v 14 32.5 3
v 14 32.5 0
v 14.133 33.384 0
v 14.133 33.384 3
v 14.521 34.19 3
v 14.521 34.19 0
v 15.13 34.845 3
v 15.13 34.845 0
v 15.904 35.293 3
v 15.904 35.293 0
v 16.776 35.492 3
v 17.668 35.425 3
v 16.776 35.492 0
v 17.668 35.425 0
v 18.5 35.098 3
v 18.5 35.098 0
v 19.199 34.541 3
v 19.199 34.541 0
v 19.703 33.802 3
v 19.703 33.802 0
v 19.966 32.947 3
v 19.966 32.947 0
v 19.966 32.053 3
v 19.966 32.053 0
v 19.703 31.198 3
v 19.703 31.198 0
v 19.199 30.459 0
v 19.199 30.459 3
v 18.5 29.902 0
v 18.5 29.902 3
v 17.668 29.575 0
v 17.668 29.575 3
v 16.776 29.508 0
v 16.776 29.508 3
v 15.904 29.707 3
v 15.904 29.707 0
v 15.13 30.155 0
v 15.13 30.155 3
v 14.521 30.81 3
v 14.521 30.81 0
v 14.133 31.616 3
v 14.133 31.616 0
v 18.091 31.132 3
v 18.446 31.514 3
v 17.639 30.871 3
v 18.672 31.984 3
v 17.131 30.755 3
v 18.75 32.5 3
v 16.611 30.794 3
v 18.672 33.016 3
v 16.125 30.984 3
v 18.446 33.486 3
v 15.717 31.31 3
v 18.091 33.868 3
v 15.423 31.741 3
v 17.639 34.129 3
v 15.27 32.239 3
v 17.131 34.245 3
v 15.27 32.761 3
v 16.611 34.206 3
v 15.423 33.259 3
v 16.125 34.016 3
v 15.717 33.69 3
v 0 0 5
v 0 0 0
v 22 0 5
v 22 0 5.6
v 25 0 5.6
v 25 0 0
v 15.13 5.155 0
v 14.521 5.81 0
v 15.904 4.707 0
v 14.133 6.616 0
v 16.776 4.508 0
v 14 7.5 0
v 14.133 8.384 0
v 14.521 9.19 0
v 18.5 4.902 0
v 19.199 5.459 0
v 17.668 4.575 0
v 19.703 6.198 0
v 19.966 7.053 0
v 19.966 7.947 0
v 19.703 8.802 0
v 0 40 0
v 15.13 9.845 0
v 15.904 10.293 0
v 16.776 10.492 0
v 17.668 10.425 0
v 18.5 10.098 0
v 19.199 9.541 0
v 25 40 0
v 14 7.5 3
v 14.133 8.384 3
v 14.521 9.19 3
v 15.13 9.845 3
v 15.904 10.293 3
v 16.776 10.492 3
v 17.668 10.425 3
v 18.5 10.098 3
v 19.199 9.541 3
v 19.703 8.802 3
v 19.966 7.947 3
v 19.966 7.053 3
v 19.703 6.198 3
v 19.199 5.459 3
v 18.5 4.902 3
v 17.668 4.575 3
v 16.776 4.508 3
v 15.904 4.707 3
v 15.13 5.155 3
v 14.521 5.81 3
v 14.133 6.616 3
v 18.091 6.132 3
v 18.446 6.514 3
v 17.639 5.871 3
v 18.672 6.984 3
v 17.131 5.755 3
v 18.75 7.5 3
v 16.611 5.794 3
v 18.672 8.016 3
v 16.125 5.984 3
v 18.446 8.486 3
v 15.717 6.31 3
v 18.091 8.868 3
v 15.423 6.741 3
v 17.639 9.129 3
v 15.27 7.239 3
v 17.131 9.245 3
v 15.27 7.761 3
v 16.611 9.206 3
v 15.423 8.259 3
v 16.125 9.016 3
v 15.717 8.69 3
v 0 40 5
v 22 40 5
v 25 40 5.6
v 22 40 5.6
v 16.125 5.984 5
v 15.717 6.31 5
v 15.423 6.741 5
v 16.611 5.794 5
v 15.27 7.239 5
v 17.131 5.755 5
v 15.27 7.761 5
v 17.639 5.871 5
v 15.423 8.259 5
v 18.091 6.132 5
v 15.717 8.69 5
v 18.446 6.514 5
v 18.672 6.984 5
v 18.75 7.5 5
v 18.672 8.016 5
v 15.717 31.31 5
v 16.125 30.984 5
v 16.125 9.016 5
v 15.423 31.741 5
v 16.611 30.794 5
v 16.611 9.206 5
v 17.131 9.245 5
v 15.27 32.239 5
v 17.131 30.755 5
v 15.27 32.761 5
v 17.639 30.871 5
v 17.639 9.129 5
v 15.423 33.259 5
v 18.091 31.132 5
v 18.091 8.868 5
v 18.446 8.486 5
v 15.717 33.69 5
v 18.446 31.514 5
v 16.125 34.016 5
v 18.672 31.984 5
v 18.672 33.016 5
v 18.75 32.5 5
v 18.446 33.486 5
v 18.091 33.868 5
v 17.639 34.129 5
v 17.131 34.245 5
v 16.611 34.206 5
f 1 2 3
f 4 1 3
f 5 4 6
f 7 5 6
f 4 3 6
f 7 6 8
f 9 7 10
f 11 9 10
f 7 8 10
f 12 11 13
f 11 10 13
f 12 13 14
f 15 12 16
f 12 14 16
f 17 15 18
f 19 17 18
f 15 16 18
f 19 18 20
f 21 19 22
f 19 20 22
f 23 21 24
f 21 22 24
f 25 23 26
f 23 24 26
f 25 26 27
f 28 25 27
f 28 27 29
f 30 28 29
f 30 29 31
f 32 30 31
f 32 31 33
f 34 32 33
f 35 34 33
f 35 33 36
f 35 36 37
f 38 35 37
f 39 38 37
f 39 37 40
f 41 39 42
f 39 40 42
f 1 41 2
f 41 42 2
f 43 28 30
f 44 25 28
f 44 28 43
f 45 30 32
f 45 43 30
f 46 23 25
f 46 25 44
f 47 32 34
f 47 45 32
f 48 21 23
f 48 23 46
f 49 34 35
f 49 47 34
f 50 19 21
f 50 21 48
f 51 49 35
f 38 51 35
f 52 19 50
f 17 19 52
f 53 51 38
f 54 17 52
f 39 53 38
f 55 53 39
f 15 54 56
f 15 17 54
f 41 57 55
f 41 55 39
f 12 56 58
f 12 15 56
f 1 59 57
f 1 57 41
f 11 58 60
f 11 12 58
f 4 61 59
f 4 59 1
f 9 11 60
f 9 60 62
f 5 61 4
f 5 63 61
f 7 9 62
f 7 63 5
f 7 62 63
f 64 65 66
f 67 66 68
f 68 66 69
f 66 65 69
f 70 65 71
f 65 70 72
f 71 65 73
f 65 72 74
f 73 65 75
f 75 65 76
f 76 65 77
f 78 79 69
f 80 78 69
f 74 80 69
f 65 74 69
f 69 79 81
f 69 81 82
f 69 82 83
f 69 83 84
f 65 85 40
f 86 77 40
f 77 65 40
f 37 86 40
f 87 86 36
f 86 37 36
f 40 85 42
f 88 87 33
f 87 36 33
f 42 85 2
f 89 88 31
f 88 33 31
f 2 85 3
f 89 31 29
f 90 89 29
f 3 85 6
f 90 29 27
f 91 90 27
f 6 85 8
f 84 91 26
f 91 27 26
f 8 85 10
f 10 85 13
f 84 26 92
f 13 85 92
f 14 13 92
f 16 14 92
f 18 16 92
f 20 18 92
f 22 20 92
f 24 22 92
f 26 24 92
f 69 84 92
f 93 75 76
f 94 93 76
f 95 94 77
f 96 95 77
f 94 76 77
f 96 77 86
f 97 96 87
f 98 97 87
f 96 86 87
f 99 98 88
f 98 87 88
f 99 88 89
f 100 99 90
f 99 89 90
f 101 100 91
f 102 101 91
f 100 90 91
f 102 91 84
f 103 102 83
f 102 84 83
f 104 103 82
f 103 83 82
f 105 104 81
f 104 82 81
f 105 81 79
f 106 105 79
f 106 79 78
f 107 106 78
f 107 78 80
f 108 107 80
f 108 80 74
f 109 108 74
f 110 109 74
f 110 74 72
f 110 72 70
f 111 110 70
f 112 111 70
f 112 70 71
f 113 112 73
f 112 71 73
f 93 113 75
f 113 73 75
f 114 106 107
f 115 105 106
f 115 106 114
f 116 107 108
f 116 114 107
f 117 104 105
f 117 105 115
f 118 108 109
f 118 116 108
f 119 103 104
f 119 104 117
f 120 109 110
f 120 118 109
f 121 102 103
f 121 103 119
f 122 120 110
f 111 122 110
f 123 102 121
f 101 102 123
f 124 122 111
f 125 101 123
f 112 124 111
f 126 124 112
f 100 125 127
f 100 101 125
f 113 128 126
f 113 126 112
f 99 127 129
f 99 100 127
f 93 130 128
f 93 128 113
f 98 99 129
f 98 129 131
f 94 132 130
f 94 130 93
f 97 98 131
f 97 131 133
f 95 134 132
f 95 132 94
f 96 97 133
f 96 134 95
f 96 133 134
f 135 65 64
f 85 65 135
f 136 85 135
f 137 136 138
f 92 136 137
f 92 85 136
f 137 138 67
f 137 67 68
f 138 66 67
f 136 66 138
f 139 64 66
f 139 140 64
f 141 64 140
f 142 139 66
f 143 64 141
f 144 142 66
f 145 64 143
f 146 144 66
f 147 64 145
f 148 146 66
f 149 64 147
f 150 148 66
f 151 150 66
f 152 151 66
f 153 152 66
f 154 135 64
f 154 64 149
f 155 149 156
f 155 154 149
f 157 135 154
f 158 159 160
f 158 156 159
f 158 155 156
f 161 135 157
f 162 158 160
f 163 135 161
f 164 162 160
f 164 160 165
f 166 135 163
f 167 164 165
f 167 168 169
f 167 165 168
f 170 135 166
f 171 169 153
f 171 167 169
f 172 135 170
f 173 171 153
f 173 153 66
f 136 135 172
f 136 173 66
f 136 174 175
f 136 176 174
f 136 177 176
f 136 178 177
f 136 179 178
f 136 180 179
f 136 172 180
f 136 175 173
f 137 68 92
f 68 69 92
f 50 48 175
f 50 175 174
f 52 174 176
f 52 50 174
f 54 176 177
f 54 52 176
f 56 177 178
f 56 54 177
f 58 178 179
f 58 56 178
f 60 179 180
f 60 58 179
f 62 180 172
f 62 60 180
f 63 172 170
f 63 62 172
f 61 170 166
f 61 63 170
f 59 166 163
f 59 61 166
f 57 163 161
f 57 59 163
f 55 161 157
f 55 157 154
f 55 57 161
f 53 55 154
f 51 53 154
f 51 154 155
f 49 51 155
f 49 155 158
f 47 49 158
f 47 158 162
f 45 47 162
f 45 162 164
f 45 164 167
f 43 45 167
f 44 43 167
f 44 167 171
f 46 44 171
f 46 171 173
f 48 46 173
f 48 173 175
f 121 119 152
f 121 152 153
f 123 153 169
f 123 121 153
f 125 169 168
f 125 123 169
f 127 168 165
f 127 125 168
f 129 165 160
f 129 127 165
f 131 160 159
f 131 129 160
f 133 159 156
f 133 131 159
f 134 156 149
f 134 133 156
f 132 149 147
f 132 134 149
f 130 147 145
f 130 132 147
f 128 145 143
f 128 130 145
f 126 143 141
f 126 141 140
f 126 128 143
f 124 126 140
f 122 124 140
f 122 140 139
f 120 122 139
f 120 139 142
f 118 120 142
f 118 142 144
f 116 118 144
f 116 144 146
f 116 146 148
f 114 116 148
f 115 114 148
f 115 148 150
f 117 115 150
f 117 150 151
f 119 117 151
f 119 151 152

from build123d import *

# Parameters (mm, degrees)
SKETCH1_W           = 25
SKETCH1_H           = 40
SKETCH1_R           = 1.75
BOSS_EXTRUDE1_DEPTH = 5
SKETCH2_W           = 3
SKETCH2_H           = 40
BOSS_EXTRUDE2_DEPTH = 0.6
SKETCH3_R           = 3
CUT_EXTRUDE1_DEPTH  = 3


with BuildPart() as part:
    # Sketch1 → Boss-Extrude1 (new body)
    with BuildSketch(Plane.XY):
        with Locations((12.5, 20)):
            Rectangle(SKETCH1_W, SKETCH1_H)
        with Locations((17, 32.5)):
            Circle(SKETCH1_R, mode=Mode.SUBTRACT)
        with Locations((17, 7.5)):
            Circle(SKETCH1_R, mode=Mode.SUBTRACT)
    extrude(amount=BOSS_EXTRUDE1_DEPTH)

    # Sketch2 → Boss-Extrude2 (add)
    with BuildSketch(Plane.XY.offset(5)):
        with Locations((23.5, 20)):
            Rectangle(SKETCH2_W, SKETCH2_H)
    extrude(amount=BOSS_EXTRUDE2_DEPTH)

    # Sketch3 → Cut-Extrude1 (cut)
    with BuildSketch(Plane(origin=(0, 0, 0), x_dir=(-1, 0, 0), z_dir=(0, 0, -1))):
        with Locations((-17, 7.5)):
            Circle(SKETCH3_R)
        with Locations((-17, 32.5)):
            Circle(SKETCH3_R)
    extrude(amount=-CUT_EXTRUDE1_DEPTH, mode=Mode.SUBTRACT)


solid = part.part
